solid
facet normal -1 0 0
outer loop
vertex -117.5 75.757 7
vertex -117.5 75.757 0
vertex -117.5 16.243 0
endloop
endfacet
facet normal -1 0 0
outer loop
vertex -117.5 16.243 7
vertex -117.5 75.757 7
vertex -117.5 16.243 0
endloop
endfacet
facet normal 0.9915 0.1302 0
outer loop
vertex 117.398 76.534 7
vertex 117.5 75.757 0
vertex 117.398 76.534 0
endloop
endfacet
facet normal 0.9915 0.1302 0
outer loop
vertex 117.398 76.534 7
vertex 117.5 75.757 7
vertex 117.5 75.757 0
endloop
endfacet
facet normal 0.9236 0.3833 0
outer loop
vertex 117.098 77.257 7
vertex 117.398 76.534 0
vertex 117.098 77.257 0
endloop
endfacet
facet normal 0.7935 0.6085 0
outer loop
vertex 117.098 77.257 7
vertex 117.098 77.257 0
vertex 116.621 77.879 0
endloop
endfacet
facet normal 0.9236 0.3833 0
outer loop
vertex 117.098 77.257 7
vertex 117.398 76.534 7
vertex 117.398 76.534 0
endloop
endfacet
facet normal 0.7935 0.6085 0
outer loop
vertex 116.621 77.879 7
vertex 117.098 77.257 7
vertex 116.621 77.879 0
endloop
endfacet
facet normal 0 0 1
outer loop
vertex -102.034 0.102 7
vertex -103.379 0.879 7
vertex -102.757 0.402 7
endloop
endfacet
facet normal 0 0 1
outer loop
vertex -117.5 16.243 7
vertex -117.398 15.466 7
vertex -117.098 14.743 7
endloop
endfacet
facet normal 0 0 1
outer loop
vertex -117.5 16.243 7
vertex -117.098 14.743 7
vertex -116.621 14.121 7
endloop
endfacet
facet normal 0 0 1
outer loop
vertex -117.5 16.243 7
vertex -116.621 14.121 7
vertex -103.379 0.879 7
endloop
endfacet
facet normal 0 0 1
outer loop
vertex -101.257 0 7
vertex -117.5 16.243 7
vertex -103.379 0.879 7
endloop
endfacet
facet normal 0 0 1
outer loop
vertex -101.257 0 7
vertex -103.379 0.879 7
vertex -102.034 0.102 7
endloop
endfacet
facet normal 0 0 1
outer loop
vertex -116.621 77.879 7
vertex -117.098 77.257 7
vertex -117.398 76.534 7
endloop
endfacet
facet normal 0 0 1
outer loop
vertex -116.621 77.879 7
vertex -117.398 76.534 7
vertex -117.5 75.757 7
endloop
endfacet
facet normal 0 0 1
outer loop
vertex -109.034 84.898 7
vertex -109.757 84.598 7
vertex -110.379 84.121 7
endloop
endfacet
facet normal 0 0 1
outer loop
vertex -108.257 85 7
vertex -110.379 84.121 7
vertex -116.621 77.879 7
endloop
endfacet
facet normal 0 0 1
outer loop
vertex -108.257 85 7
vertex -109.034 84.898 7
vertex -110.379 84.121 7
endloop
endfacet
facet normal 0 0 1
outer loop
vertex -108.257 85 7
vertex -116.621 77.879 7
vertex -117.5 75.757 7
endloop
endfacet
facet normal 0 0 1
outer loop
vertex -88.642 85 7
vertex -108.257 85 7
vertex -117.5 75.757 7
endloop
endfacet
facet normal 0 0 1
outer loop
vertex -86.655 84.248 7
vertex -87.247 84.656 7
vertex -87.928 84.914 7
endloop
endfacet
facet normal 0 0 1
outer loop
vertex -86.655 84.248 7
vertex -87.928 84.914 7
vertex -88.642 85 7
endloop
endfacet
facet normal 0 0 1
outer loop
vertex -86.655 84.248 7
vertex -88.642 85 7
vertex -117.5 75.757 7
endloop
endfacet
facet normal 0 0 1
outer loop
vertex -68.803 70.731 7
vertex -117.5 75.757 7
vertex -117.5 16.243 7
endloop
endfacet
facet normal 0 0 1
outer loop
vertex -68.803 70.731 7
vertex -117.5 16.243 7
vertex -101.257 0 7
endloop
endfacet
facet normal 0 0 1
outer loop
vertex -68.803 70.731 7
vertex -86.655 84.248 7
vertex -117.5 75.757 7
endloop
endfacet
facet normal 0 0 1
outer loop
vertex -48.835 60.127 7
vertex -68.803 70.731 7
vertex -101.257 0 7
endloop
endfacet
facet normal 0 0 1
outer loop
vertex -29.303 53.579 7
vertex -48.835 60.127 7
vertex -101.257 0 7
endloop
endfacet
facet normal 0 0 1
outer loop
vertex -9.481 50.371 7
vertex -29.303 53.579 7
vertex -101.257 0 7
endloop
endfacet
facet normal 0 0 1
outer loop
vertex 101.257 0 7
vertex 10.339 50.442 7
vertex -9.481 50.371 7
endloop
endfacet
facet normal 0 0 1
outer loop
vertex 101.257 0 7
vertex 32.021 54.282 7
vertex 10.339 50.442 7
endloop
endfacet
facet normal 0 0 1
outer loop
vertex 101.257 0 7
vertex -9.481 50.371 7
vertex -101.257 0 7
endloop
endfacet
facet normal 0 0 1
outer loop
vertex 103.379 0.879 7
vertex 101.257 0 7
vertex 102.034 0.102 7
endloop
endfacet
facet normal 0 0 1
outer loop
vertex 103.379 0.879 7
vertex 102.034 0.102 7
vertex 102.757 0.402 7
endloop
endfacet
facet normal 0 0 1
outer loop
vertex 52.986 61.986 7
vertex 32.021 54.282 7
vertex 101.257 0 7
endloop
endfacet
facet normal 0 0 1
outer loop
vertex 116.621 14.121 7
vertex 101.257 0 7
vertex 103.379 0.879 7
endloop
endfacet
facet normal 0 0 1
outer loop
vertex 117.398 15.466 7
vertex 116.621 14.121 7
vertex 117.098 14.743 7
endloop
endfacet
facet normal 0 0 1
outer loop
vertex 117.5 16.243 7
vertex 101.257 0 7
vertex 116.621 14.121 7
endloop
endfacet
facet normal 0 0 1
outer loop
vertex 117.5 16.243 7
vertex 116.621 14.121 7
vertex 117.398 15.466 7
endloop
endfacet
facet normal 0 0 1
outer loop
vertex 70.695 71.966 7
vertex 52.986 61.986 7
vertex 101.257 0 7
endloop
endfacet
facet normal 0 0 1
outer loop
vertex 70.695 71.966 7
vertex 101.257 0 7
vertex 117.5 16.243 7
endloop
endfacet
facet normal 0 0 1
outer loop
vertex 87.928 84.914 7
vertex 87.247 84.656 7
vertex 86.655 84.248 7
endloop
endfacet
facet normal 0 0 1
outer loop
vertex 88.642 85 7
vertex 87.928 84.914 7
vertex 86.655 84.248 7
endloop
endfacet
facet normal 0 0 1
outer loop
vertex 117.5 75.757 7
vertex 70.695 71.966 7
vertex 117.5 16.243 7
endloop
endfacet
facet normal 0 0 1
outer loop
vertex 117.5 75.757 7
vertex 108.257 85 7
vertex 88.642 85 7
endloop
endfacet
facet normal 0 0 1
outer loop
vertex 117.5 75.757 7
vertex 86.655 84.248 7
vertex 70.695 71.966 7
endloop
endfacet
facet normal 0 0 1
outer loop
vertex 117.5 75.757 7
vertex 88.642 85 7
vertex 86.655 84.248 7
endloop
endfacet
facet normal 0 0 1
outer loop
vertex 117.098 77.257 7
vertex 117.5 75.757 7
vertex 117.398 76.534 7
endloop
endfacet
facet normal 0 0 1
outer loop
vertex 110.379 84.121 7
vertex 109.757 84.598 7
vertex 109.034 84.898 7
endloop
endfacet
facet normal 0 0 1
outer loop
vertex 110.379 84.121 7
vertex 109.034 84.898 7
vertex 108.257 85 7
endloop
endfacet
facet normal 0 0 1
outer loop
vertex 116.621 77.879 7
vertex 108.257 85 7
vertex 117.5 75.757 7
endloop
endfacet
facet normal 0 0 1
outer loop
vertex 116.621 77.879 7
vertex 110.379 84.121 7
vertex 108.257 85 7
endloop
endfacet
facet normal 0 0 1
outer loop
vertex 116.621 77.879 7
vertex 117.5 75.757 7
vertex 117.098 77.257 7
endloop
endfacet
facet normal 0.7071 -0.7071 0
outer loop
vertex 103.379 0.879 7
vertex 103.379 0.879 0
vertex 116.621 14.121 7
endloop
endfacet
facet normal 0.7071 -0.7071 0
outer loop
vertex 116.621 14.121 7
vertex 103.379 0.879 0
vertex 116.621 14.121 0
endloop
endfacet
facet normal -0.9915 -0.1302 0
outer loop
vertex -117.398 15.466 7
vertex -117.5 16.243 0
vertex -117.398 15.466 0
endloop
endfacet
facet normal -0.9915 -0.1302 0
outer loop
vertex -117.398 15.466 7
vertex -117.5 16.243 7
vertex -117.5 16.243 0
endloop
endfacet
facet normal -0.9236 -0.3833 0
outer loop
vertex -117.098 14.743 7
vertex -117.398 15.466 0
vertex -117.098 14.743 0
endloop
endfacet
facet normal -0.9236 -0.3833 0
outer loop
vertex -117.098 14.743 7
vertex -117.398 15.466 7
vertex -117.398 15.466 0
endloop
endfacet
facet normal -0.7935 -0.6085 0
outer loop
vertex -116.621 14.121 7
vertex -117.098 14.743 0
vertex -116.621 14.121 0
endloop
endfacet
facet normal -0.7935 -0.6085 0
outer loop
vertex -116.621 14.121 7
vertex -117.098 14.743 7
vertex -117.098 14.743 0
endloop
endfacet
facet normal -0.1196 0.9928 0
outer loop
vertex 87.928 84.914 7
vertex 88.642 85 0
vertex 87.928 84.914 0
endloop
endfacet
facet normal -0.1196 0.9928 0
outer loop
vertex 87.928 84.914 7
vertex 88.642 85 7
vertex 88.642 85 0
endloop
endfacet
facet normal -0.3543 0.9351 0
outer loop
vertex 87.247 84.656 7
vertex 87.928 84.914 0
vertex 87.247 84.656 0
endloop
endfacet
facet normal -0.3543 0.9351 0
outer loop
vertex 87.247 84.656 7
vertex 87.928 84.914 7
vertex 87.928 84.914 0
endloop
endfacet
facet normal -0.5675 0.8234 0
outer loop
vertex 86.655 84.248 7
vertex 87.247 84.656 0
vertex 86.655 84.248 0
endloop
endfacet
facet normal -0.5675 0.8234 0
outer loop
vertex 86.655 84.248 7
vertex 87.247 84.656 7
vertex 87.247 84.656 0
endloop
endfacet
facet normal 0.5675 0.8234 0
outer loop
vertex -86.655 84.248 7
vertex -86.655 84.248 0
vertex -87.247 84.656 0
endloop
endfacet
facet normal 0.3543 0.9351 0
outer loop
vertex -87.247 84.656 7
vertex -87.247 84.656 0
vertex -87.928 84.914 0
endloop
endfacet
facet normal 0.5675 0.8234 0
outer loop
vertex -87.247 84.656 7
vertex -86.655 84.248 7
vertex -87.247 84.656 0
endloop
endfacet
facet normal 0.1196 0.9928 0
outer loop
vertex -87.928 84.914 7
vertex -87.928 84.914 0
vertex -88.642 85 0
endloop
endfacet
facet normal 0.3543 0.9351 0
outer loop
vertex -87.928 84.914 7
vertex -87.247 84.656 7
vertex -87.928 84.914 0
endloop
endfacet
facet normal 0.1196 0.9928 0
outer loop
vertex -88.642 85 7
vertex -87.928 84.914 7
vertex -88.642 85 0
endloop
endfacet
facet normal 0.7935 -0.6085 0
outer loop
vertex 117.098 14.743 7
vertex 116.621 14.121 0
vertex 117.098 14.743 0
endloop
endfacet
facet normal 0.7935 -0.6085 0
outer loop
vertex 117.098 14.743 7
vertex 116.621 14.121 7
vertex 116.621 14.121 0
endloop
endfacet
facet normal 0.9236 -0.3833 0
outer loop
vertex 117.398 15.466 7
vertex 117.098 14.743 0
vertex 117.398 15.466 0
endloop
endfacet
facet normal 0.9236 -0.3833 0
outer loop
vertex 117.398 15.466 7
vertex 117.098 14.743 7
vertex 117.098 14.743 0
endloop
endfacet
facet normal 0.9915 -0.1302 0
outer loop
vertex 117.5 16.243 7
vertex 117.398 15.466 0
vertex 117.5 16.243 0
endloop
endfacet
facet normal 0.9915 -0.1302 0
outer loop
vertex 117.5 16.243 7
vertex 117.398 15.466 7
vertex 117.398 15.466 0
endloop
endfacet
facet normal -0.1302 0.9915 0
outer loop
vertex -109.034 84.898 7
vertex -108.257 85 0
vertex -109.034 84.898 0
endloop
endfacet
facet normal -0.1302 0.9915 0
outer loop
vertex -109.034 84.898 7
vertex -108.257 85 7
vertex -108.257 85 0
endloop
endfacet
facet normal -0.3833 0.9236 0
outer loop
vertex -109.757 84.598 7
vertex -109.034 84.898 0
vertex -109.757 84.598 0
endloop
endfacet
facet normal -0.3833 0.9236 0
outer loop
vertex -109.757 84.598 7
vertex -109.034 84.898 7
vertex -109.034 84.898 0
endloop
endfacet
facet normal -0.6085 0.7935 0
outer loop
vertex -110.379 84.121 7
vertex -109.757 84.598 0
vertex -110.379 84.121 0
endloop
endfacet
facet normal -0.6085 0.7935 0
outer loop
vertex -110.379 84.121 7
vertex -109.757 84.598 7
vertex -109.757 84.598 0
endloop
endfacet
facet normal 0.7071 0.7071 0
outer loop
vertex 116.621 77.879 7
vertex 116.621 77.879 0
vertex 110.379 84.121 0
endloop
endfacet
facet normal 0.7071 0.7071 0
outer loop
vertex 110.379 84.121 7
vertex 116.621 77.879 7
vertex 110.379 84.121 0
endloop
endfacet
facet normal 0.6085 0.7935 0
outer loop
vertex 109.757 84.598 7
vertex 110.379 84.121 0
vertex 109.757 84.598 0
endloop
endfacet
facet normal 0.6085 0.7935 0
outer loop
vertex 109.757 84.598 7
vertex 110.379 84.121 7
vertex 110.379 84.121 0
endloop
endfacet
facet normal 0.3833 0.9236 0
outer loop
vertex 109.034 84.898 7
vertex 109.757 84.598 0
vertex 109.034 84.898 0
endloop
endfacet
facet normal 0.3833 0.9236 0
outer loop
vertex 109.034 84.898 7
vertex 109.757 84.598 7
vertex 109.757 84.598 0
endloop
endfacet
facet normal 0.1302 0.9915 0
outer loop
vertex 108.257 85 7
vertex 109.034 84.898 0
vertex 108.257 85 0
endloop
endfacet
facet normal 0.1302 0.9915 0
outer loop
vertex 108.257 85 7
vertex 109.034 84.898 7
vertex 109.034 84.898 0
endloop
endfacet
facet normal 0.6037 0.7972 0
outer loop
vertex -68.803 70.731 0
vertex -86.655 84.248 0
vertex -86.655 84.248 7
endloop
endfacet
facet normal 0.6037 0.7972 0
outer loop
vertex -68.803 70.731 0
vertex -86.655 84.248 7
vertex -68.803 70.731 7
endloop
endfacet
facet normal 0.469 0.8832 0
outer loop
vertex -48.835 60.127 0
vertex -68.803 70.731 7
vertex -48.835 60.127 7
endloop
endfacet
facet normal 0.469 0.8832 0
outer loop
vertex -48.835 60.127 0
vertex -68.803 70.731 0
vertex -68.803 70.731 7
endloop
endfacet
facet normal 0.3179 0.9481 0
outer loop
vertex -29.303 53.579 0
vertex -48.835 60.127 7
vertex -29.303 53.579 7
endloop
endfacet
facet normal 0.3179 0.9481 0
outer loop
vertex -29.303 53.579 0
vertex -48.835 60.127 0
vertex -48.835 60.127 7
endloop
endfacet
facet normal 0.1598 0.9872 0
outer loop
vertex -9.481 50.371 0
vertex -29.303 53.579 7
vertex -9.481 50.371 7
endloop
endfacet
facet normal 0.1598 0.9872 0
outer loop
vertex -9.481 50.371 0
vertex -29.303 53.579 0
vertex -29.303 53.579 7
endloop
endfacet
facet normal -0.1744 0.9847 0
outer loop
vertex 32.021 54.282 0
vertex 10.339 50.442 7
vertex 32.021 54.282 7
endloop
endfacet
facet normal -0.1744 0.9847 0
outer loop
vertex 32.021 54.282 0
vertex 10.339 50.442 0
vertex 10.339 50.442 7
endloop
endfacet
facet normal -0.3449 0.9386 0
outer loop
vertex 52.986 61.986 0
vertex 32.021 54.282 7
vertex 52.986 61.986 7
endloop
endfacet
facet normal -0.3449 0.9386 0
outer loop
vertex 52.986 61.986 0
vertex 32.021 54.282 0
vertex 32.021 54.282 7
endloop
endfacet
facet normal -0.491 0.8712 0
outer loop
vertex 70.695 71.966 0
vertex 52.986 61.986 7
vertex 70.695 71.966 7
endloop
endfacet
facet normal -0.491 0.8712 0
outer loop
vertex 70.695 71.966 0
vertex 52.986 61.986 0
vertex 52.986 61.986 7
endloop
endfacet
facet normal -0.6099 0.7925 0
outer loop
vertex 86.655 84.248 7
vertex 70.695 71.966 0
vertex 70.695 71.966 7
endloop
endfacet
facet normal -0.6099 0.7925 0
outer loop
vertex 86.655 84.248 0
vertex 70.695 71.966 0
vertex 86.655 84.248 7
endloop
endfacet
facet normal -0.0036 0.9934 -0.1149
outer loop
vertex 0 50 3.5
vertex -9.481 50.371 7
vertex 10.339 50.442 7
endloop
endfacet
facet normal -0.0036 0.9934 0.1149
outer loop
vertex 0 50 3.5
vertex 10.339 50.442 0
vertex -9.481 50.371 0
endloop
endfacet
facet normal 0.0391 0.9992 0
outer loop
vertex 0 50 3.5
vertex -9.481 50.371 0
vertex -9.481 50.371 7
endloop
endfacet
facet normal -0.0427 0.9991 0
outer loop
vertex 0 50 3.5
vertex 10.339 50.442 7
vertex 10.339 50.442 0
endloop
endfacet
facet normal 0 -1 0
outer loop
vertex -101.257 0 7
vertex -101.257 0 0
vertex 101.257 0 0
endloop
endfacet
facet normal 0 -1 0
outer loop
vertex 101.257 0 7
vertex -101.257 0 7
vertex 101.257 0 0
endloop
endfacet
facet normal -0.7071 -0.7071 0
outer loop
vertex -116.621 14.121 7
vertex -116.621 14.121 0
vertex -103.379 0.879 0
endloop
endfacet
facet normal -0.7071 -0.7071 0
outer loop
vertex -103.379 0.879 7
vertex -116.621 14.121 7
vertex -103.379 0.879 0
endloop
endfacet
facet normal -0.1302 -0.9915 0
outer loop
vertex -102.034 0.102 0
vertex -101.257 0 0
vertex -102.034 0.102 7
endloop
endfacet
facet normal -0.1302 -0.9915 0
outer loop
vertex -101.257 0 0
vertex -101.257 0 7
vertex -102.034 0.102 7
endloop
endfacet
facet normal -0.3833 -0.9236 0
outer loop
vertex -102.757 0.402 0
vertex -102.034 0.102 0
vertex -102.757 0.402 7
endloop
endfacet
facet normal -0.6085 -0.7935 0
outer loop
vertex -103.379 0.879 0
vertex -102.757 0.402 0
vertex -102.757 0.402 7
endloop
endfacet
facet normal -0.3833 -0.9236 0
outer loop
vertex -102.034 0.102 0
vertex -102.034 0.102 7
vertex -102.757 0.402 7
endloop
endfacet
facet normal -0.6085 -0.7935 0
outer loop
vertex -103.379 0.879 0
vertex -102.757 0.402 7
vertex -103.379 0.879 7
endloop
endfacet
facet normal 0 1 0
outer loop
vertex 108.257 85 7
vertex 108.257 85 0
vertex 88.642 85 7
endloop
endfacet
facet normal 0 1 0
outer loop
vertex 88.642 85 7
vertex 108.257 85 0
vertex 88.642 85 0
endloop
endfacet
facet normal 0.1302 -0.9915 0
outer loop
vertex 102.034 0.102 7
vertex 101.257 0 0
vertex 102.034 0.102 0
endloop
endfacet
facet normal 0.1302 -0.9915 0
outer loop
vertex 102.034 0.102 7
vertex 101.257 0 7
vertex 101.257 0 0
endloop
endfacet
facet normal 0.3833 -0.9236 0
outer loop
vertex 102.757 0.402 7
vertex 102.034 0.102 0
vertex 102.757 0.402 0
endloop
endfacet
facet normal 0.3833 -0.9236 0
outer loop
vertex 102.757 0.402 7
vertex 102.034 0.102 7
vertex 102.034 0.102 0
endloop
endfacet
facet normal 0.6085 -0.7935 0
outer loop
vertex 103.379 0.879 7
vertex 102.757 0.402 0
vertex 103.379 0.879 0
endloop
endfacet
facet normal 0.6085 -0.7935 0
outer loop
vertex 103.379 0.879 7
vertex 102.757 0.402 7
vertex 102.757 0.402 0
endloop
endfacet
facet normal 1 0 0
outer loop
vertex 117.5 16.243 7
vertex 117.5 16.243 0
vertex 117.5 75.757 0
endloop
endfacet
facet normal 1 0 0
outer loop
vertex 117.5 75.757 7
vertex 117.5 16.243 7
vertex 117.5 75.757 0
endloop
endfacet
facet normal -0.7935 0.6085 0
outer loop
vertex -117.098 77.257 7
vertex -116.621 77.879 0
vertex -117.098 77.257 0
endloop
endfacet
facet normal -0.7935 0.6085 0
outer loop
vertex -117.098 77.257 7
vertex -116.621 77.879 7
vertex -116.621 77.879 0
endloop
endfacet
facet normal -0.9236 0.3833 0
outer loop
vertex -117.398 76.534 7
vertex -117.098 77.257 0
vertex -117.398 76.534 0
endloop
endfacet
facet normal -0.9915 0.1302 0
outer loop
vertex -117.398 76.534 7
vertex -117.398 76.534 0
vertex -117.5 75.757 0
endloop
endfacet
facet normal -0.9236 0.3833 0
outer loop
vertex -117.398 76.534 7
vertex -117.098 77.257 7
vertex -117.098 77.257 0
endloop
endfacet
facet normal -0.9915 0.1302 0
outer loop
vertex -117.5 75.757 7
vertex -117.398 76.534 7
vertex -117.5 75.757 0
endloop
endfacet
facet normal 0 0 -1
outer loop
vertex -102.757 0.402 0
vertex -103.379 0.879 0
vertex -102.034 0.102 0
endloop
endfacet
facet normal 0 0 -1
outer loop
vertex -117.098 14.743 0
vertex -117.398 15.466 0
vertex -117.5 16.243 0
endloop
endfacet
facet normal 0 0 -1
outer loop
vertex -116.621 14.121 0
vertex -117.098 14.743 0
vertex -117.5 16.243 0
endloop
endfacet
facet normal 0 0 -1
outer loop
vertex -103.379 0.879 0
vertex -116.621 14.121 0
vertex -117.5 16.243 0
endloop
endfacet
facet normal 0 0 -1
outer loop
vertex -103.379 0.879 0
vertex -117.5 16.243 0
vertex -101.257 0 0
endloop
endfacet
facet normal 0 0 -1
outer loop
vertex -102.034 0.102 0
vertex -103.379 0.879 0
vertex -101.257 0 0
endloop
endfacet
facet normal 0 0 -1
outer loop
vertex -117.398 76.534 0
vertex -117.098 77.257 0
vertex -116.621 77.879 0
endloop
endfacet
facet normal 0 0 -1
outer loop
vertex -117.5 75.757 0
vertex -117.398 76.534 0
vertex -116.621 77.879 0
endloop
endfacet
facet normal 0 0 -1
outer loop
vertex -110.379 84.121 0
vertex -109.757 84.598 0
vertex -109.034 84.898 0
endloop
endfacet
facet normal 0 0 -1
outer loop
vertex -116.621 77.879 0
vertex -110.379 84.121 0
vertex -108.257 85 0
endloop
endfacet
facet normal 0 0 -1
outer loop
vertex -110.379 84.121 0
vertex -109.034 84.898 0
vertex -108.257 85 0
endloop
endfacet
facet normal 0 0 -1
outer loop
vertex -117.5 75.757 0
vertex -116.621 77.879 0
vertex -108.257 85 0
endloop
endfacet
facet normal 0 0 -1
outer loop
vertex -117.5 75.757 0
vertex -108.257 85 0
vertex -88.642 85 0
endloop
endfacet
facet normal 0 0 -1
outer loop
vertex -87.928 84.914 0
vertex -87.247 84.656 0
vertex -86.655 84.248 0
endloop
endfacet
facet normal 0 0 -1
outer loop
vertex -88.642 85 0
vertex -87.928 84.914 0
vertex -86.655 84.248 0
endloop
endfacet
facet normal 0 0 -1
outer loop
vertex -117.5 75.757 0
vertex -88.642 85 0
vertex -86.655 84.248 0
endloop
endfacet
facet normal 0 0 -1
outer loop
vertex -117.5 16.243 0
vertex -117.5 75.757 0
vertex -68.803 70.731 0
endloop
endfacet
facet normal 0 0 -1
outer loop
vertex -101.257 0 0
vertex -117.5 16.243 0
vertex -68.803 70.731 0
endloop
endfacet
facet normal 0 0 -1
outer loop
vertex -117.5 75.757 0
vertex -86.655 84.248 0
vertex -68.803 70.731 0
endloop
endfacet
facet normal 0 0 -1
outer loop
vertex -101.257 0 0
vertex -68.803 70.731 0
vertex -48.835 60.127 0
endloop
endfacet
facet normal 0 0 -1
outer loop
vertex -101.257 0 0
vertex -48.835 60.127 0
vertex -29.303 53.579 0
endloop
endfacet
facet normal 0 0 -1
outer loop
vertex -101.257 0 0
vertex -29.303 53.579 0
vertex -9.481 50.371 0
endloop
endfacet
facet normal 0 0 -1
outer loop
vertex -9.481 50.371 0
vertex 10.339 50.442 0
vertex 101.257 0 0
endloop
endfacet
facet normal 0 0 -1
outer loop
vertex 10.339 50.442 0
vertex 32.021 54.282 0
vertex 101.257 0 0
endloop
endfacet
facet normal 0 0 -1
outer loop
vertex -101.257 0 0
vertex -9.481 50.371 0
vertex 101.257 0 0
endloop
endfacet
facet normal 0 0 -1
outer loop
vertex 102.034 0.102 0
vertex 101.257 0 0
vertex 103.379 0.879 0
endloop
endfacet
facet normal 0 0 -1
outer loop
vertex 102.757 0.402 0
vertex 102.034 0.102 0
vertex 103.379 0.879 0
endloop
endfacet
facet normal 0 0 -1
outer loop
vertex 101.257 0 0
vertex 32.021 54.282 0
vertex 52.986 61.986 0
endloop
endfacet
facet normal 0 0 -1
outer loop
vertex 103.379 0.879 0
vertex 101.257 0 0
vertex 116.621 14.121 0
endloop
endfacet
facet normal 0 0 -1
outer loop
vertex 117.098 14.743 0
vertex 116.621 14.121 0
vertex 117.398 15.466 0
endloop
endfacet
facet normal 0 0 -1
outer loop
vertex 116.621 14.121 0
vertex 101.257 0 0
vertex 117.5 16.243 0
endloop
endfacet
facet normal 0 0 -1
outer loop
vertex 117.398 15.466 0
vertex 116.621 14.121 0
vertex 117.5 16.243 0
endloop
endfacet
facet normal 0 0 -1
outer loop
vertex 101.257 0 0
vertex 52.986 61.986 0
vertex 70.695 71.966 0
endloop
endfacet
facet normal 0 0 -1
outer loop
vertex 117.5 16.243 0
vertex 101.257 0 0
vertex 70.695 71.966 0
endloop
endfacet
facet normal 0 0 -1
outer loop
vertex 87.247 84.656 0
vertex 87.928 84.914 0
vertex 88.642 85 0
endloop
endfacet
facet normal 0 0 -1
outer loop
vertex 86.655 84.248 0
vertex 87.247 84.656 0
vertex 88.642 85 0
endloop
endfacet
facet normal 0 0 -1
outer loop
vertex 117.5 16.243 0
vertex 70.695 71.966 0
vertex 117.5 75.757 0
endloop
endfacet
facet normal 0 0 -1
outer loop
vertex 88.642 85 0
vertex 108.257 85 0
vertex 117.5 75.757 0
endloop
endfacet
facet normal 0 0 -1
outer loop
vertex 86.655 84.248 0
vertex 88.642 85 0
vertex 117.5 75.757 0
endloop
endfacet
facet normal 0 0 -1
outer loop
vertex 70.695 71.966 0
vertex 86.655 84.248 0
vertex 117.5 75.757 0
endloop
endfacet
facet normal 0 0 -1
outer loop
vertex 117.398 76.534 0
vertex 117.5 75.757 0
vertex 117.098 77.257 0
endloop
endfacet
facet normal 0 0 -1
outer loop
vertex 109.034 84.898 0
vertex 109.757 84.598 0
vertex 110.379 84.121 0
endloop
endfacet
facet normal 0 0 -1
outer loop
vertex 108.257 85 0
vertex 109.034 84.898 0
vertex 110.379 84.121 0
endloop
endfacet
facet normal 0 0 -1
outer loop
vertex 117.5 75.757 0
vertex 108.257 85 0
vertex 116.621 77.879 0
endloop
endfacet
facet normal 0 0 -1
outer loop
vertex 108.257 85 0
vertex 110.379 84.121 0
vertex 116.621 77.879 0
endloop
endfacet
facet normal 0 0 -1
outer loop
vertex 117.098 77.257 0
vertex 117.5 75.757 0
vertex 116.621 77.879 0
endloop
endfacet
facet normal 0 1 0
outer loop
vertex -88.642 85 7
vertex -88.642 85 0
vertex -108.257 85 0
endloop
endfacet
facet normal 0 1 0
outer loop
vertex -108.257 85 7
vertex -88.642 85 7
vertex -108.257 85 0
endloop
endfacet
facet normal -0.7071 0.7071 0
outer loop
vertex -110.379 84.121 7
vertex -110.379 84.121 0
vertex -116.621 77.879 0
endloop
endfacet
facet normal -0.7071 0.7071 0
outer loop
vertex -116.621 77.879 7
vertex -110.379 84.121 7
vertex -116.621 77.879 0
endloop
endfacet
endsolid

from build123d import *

# Parameters (mm, degrees)
BASE_EXTRUDE_DEPTH = 7
FILLET1_R          = 3


with BuildPart() as part:
    # Sketch1 → Base-Extrude (new body)
    with BuildSketch(Plane.XY):
        with BuildLine():
            Line((-102.5, 0), (102.5, 0))
            Line((102.5, 0), (117.5, 15))
            Line((117.5, 15), (117.5, 77))
            Line((117.5, 77), (109.5, 85))
            Line((109.5, 85), (87.5, 85))
            add(Edge.make_bspline(
                [(-87.5, 85), (0, 6.551724138), (87.5, 85)],
                knots=[2.507408813, 2.507408813, 2.507408813, 3.775776494, 3.775776494, 3.775776494], degree=2, weights=[1, 0.805555556, 1]))
            Line((-87.5, 85), (-109.5, 85))
            Line((-109.5, 85), (-117.5, 77))
            Line((-117.5, 77), (-117.5, 15))
            Line((-117.5, 15), (-102.5, 0))
        make_face()
    extrude(amount=BASE_EXTRUDE_DEPTH)

    # Fillet1
    fillet1_edges = [part.edges().sort_by_distance(p)[0] for p in [
        (102.5, 0, 3.5),
        (-102.5, 0, 3.5),
        (-117.5, 15, 3.5),
        (-117.5, 77, 3.5),
        (-109.5, 85, 3.5),
        (-87.5, 85, 3.5),
        (87.5, 85, 3.5),
        (109.5, 85, 3.5),
        (117.5, 77, 3.5),
        (117.5, 15, 3.5),
    ]]
    fillet(fillet1_edges, radius=FILLET1_R)


solid = part.part
